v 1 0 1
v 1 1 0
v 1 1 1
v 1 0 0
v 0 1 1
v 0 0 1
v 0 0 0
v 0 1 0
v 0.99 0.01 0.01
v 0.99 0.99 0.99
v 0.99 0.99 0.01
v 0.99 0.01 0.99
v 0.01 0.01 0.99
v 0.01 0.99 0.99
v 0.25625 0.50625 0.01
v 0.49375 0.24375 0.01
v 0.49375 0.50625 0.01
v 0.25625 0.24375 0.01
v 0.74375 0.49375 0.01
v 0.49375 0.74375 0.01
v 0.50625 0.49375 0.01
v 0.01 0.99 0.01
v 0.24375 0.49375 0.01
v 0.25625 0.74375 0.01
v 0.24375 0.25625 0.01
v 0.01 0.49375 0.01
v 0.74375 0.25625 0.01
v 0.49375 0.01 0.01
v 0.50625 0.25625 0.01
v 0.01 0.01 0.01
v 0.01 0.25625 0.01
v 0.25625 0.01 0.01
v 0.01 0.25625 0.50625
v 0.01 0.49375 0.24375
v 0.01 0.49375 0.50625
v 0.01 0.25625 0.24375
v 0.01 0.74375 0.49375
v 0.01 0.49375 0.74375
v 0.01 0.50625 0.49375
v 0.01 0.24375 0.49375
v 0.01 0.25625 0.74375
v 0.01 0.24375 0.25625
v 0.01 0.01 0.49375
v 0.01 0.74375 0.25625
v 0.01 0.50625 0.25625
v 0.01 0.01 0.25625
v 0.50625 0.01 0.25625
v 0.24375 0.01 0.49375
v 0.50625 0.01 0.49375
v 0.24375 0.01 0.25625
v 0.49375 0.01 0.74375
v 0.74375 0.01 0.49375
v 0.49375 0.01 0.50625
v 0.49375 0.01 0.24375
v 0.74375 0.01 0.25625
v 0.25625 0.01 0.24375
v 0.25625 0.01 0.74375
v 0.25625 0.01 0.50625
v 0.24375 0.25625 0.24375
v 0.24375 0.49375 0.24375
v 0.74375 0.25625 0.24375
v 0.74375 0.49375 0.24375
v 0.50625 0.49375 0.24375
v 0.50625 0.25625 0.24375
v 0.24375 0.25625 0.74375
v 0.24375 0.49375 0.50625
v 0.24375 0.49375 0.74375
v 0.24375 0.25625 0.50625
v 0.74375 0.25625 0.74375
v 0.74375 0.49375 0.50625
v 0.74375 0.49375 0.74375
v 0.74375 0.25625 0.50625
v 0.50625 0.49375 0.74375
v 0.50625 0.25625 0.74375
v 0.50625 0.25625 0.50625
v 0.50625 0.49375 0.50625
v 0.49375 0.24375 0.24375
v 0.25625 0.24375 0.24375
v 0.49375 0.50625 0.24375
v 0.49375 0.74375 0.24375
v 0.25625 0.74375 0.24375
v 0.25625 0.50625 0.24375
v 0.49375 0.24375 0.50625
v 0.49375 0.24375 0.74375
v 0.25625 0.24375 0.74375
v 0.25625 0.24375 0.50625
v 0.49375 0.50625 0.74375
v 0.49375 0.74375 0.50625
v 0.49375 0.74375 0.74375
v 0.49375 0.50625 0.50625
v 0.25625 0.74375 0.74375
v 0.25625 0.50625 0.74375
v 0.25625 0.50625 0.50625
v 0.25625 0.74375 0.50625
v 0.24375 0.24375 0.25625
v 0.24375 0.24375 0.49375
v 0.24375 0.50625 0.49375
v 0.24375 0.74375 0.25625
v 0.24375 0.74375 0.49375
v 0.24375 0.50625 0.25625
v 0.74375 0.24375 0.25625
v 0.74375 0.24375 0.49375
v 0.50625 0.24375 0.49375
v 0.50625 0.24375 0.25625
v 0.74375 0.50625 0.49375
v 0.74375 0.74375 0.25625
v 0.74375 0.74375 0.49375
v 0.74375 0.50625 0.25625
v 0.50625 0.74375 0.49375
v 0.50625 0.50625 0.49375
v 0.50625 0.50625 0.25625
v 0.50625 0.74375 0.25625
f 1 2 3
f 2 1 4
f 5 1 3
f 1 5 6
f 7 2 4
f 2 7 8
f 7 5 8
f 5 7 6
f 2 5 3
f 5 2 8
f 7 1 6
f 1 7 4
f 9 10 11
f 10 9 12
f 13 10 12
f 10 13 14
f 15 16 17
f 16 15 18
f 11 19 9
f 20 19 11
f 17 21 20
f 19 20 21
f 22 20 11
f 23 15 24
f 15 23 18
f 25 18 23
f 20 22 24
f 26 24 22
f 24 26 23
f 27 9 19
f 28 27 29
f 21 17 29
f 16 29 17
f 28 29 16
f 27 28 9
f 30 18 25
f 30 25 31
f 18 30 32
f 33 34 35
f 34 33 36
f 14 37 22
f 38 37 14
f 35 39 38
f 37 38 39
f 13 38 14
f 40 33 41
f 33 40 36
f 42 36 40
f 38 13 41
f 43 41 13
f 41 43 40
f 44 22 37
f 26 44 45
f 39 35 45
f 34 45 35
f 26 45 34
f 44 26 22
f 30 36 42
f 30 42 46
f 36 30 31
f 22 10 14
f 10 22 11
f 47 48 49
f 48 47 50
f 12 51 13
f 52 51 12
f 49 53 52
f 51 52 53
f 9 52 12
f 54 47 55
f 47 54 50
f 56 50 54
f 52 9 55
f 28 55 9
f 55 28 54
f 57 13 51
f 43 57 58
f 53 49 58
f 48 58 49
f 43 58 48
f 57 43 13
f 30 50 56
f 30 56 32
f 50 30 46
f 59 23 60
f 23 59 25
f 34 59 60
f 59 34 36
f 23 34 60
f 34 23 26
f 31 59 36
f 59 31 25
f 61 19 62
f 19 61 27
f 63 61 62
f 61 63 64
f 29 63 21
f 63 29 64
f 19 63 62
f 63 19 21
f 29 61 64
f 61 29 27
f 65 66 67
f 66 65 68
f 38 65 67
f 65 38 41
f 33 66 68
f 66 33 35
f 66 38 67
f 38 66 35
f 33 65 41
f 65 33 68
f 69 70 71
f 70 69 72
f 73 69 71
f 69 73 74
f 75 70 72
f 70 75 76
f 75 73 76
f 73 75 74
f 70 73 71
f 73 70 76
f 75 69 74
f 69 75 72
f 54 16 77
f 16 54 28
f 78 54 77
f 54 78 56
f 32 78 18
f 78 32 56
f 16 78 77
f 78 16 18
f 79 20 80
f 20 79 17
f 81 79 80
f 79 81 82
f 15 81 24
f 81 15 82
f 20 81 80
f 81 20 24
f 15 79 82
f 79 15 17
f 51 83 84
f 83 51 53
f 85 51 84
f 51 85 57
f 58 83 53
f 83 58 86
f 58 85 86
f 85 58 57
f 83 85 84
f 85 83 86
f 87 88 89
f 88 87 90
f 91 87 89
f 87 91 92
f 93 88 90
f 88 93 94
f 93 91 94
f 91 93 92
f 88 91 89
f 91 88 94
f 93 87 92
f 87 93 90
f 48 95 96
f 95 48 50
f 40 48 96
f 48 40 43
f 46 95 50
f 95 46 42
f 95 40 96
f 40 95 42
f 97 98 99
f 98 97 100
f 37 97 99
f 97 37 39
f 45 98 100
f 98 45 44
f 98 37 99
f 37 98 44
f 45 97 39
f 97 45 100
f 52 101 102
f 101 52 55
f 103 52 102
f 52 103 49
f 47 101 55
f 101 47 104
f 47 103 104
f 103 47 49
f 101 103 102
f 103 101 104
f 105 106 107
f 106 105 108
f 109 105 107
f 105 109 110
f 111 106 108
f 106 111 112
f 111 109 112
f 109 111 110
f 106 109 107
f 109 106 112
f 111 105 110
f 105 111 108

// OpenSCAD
translate([0.125, 0.375, 0.125]) color([0.3394448706328078, 0.45855440081433096, 0.0007502935671159783]) cube([0.2375, 0.2375, 0.2375], center=true);
translate([0.625, 0.375, 0.125]) color([0.8084995756647368, 0.0331322283588068, 0.9954935019736515]) cube([0.2375, 0.2375, 0.2375], center=true);
translate([0.125, 0.375, 0.625]) color([0.32750610520168044, 0.511786711221762, 0.09639677946248049]) cube([0.2375, 0.2375, 0.2375], center=true);
translate([0.625, 0.375, 0.625]) color([0.46647601470953737, 0.043404226035316795, 0.8089506697449751]) cube([0.2375, 0.2375, 0.2375], center=true);
translate([0.375, 0.125, 0.125]) color([0.9065579579370614, 0.48874197586323487, 0.4689182776921319]) cube([0.2375, 0.2375, 0.2375], center=true);
translate([0.375, 0.625, 0.125]) color([0.9999833648369341, 0.42392948264922625, 0.11056216143511133]) cube([0.2375, 0.2375, 0.2375], center=true);
translate([0.375, 0.125, 0.625]) color([0.5007484231317689, 0.23725843071495933, 0.7435751616565288]) cube([0.2375, 0.2375, 0.2375], center=true);
translate([0.375, 0.625, 0.625]) color([0.030326511183225713, 0.9534383365251057, 0.44454391677925087]) cube([0.2375, 0.2375, 0.2375], center=true);
translate([0.125, 0.125, 0.375]) color([0.4017260225039573, 0.6984802625757133, 0.14751428227125585]) cube([0.2375, 0.2375, 0.2375], center=true);
translate([0.125, 0.625, 0.375]) color([0.592053202978914, 0.7602792343344718, 0.23214841748979886]) cube([0.2375, 0.2375, 0.2375], center=true);
translate([0.625, 0.125, 0.375]) color([0.2215781656479593, 0.24536616409996503, 0.7021925659500807]) cube([0.2375, 0.2375, 0.2375], center=true);
translate([0.625, 0.625, 0.375]) color([0.5457605096294114, 0.54011508338913, 0.5459453680001618]) cube([0.2375, 0.2375, 0.2375], center=true);
color([0.3,0.3,0.3,0.3]) difference() { cube([1,1,1]); translate([0.01,0.01,0.01]) cube([0.98,0.98,0.98]); }
